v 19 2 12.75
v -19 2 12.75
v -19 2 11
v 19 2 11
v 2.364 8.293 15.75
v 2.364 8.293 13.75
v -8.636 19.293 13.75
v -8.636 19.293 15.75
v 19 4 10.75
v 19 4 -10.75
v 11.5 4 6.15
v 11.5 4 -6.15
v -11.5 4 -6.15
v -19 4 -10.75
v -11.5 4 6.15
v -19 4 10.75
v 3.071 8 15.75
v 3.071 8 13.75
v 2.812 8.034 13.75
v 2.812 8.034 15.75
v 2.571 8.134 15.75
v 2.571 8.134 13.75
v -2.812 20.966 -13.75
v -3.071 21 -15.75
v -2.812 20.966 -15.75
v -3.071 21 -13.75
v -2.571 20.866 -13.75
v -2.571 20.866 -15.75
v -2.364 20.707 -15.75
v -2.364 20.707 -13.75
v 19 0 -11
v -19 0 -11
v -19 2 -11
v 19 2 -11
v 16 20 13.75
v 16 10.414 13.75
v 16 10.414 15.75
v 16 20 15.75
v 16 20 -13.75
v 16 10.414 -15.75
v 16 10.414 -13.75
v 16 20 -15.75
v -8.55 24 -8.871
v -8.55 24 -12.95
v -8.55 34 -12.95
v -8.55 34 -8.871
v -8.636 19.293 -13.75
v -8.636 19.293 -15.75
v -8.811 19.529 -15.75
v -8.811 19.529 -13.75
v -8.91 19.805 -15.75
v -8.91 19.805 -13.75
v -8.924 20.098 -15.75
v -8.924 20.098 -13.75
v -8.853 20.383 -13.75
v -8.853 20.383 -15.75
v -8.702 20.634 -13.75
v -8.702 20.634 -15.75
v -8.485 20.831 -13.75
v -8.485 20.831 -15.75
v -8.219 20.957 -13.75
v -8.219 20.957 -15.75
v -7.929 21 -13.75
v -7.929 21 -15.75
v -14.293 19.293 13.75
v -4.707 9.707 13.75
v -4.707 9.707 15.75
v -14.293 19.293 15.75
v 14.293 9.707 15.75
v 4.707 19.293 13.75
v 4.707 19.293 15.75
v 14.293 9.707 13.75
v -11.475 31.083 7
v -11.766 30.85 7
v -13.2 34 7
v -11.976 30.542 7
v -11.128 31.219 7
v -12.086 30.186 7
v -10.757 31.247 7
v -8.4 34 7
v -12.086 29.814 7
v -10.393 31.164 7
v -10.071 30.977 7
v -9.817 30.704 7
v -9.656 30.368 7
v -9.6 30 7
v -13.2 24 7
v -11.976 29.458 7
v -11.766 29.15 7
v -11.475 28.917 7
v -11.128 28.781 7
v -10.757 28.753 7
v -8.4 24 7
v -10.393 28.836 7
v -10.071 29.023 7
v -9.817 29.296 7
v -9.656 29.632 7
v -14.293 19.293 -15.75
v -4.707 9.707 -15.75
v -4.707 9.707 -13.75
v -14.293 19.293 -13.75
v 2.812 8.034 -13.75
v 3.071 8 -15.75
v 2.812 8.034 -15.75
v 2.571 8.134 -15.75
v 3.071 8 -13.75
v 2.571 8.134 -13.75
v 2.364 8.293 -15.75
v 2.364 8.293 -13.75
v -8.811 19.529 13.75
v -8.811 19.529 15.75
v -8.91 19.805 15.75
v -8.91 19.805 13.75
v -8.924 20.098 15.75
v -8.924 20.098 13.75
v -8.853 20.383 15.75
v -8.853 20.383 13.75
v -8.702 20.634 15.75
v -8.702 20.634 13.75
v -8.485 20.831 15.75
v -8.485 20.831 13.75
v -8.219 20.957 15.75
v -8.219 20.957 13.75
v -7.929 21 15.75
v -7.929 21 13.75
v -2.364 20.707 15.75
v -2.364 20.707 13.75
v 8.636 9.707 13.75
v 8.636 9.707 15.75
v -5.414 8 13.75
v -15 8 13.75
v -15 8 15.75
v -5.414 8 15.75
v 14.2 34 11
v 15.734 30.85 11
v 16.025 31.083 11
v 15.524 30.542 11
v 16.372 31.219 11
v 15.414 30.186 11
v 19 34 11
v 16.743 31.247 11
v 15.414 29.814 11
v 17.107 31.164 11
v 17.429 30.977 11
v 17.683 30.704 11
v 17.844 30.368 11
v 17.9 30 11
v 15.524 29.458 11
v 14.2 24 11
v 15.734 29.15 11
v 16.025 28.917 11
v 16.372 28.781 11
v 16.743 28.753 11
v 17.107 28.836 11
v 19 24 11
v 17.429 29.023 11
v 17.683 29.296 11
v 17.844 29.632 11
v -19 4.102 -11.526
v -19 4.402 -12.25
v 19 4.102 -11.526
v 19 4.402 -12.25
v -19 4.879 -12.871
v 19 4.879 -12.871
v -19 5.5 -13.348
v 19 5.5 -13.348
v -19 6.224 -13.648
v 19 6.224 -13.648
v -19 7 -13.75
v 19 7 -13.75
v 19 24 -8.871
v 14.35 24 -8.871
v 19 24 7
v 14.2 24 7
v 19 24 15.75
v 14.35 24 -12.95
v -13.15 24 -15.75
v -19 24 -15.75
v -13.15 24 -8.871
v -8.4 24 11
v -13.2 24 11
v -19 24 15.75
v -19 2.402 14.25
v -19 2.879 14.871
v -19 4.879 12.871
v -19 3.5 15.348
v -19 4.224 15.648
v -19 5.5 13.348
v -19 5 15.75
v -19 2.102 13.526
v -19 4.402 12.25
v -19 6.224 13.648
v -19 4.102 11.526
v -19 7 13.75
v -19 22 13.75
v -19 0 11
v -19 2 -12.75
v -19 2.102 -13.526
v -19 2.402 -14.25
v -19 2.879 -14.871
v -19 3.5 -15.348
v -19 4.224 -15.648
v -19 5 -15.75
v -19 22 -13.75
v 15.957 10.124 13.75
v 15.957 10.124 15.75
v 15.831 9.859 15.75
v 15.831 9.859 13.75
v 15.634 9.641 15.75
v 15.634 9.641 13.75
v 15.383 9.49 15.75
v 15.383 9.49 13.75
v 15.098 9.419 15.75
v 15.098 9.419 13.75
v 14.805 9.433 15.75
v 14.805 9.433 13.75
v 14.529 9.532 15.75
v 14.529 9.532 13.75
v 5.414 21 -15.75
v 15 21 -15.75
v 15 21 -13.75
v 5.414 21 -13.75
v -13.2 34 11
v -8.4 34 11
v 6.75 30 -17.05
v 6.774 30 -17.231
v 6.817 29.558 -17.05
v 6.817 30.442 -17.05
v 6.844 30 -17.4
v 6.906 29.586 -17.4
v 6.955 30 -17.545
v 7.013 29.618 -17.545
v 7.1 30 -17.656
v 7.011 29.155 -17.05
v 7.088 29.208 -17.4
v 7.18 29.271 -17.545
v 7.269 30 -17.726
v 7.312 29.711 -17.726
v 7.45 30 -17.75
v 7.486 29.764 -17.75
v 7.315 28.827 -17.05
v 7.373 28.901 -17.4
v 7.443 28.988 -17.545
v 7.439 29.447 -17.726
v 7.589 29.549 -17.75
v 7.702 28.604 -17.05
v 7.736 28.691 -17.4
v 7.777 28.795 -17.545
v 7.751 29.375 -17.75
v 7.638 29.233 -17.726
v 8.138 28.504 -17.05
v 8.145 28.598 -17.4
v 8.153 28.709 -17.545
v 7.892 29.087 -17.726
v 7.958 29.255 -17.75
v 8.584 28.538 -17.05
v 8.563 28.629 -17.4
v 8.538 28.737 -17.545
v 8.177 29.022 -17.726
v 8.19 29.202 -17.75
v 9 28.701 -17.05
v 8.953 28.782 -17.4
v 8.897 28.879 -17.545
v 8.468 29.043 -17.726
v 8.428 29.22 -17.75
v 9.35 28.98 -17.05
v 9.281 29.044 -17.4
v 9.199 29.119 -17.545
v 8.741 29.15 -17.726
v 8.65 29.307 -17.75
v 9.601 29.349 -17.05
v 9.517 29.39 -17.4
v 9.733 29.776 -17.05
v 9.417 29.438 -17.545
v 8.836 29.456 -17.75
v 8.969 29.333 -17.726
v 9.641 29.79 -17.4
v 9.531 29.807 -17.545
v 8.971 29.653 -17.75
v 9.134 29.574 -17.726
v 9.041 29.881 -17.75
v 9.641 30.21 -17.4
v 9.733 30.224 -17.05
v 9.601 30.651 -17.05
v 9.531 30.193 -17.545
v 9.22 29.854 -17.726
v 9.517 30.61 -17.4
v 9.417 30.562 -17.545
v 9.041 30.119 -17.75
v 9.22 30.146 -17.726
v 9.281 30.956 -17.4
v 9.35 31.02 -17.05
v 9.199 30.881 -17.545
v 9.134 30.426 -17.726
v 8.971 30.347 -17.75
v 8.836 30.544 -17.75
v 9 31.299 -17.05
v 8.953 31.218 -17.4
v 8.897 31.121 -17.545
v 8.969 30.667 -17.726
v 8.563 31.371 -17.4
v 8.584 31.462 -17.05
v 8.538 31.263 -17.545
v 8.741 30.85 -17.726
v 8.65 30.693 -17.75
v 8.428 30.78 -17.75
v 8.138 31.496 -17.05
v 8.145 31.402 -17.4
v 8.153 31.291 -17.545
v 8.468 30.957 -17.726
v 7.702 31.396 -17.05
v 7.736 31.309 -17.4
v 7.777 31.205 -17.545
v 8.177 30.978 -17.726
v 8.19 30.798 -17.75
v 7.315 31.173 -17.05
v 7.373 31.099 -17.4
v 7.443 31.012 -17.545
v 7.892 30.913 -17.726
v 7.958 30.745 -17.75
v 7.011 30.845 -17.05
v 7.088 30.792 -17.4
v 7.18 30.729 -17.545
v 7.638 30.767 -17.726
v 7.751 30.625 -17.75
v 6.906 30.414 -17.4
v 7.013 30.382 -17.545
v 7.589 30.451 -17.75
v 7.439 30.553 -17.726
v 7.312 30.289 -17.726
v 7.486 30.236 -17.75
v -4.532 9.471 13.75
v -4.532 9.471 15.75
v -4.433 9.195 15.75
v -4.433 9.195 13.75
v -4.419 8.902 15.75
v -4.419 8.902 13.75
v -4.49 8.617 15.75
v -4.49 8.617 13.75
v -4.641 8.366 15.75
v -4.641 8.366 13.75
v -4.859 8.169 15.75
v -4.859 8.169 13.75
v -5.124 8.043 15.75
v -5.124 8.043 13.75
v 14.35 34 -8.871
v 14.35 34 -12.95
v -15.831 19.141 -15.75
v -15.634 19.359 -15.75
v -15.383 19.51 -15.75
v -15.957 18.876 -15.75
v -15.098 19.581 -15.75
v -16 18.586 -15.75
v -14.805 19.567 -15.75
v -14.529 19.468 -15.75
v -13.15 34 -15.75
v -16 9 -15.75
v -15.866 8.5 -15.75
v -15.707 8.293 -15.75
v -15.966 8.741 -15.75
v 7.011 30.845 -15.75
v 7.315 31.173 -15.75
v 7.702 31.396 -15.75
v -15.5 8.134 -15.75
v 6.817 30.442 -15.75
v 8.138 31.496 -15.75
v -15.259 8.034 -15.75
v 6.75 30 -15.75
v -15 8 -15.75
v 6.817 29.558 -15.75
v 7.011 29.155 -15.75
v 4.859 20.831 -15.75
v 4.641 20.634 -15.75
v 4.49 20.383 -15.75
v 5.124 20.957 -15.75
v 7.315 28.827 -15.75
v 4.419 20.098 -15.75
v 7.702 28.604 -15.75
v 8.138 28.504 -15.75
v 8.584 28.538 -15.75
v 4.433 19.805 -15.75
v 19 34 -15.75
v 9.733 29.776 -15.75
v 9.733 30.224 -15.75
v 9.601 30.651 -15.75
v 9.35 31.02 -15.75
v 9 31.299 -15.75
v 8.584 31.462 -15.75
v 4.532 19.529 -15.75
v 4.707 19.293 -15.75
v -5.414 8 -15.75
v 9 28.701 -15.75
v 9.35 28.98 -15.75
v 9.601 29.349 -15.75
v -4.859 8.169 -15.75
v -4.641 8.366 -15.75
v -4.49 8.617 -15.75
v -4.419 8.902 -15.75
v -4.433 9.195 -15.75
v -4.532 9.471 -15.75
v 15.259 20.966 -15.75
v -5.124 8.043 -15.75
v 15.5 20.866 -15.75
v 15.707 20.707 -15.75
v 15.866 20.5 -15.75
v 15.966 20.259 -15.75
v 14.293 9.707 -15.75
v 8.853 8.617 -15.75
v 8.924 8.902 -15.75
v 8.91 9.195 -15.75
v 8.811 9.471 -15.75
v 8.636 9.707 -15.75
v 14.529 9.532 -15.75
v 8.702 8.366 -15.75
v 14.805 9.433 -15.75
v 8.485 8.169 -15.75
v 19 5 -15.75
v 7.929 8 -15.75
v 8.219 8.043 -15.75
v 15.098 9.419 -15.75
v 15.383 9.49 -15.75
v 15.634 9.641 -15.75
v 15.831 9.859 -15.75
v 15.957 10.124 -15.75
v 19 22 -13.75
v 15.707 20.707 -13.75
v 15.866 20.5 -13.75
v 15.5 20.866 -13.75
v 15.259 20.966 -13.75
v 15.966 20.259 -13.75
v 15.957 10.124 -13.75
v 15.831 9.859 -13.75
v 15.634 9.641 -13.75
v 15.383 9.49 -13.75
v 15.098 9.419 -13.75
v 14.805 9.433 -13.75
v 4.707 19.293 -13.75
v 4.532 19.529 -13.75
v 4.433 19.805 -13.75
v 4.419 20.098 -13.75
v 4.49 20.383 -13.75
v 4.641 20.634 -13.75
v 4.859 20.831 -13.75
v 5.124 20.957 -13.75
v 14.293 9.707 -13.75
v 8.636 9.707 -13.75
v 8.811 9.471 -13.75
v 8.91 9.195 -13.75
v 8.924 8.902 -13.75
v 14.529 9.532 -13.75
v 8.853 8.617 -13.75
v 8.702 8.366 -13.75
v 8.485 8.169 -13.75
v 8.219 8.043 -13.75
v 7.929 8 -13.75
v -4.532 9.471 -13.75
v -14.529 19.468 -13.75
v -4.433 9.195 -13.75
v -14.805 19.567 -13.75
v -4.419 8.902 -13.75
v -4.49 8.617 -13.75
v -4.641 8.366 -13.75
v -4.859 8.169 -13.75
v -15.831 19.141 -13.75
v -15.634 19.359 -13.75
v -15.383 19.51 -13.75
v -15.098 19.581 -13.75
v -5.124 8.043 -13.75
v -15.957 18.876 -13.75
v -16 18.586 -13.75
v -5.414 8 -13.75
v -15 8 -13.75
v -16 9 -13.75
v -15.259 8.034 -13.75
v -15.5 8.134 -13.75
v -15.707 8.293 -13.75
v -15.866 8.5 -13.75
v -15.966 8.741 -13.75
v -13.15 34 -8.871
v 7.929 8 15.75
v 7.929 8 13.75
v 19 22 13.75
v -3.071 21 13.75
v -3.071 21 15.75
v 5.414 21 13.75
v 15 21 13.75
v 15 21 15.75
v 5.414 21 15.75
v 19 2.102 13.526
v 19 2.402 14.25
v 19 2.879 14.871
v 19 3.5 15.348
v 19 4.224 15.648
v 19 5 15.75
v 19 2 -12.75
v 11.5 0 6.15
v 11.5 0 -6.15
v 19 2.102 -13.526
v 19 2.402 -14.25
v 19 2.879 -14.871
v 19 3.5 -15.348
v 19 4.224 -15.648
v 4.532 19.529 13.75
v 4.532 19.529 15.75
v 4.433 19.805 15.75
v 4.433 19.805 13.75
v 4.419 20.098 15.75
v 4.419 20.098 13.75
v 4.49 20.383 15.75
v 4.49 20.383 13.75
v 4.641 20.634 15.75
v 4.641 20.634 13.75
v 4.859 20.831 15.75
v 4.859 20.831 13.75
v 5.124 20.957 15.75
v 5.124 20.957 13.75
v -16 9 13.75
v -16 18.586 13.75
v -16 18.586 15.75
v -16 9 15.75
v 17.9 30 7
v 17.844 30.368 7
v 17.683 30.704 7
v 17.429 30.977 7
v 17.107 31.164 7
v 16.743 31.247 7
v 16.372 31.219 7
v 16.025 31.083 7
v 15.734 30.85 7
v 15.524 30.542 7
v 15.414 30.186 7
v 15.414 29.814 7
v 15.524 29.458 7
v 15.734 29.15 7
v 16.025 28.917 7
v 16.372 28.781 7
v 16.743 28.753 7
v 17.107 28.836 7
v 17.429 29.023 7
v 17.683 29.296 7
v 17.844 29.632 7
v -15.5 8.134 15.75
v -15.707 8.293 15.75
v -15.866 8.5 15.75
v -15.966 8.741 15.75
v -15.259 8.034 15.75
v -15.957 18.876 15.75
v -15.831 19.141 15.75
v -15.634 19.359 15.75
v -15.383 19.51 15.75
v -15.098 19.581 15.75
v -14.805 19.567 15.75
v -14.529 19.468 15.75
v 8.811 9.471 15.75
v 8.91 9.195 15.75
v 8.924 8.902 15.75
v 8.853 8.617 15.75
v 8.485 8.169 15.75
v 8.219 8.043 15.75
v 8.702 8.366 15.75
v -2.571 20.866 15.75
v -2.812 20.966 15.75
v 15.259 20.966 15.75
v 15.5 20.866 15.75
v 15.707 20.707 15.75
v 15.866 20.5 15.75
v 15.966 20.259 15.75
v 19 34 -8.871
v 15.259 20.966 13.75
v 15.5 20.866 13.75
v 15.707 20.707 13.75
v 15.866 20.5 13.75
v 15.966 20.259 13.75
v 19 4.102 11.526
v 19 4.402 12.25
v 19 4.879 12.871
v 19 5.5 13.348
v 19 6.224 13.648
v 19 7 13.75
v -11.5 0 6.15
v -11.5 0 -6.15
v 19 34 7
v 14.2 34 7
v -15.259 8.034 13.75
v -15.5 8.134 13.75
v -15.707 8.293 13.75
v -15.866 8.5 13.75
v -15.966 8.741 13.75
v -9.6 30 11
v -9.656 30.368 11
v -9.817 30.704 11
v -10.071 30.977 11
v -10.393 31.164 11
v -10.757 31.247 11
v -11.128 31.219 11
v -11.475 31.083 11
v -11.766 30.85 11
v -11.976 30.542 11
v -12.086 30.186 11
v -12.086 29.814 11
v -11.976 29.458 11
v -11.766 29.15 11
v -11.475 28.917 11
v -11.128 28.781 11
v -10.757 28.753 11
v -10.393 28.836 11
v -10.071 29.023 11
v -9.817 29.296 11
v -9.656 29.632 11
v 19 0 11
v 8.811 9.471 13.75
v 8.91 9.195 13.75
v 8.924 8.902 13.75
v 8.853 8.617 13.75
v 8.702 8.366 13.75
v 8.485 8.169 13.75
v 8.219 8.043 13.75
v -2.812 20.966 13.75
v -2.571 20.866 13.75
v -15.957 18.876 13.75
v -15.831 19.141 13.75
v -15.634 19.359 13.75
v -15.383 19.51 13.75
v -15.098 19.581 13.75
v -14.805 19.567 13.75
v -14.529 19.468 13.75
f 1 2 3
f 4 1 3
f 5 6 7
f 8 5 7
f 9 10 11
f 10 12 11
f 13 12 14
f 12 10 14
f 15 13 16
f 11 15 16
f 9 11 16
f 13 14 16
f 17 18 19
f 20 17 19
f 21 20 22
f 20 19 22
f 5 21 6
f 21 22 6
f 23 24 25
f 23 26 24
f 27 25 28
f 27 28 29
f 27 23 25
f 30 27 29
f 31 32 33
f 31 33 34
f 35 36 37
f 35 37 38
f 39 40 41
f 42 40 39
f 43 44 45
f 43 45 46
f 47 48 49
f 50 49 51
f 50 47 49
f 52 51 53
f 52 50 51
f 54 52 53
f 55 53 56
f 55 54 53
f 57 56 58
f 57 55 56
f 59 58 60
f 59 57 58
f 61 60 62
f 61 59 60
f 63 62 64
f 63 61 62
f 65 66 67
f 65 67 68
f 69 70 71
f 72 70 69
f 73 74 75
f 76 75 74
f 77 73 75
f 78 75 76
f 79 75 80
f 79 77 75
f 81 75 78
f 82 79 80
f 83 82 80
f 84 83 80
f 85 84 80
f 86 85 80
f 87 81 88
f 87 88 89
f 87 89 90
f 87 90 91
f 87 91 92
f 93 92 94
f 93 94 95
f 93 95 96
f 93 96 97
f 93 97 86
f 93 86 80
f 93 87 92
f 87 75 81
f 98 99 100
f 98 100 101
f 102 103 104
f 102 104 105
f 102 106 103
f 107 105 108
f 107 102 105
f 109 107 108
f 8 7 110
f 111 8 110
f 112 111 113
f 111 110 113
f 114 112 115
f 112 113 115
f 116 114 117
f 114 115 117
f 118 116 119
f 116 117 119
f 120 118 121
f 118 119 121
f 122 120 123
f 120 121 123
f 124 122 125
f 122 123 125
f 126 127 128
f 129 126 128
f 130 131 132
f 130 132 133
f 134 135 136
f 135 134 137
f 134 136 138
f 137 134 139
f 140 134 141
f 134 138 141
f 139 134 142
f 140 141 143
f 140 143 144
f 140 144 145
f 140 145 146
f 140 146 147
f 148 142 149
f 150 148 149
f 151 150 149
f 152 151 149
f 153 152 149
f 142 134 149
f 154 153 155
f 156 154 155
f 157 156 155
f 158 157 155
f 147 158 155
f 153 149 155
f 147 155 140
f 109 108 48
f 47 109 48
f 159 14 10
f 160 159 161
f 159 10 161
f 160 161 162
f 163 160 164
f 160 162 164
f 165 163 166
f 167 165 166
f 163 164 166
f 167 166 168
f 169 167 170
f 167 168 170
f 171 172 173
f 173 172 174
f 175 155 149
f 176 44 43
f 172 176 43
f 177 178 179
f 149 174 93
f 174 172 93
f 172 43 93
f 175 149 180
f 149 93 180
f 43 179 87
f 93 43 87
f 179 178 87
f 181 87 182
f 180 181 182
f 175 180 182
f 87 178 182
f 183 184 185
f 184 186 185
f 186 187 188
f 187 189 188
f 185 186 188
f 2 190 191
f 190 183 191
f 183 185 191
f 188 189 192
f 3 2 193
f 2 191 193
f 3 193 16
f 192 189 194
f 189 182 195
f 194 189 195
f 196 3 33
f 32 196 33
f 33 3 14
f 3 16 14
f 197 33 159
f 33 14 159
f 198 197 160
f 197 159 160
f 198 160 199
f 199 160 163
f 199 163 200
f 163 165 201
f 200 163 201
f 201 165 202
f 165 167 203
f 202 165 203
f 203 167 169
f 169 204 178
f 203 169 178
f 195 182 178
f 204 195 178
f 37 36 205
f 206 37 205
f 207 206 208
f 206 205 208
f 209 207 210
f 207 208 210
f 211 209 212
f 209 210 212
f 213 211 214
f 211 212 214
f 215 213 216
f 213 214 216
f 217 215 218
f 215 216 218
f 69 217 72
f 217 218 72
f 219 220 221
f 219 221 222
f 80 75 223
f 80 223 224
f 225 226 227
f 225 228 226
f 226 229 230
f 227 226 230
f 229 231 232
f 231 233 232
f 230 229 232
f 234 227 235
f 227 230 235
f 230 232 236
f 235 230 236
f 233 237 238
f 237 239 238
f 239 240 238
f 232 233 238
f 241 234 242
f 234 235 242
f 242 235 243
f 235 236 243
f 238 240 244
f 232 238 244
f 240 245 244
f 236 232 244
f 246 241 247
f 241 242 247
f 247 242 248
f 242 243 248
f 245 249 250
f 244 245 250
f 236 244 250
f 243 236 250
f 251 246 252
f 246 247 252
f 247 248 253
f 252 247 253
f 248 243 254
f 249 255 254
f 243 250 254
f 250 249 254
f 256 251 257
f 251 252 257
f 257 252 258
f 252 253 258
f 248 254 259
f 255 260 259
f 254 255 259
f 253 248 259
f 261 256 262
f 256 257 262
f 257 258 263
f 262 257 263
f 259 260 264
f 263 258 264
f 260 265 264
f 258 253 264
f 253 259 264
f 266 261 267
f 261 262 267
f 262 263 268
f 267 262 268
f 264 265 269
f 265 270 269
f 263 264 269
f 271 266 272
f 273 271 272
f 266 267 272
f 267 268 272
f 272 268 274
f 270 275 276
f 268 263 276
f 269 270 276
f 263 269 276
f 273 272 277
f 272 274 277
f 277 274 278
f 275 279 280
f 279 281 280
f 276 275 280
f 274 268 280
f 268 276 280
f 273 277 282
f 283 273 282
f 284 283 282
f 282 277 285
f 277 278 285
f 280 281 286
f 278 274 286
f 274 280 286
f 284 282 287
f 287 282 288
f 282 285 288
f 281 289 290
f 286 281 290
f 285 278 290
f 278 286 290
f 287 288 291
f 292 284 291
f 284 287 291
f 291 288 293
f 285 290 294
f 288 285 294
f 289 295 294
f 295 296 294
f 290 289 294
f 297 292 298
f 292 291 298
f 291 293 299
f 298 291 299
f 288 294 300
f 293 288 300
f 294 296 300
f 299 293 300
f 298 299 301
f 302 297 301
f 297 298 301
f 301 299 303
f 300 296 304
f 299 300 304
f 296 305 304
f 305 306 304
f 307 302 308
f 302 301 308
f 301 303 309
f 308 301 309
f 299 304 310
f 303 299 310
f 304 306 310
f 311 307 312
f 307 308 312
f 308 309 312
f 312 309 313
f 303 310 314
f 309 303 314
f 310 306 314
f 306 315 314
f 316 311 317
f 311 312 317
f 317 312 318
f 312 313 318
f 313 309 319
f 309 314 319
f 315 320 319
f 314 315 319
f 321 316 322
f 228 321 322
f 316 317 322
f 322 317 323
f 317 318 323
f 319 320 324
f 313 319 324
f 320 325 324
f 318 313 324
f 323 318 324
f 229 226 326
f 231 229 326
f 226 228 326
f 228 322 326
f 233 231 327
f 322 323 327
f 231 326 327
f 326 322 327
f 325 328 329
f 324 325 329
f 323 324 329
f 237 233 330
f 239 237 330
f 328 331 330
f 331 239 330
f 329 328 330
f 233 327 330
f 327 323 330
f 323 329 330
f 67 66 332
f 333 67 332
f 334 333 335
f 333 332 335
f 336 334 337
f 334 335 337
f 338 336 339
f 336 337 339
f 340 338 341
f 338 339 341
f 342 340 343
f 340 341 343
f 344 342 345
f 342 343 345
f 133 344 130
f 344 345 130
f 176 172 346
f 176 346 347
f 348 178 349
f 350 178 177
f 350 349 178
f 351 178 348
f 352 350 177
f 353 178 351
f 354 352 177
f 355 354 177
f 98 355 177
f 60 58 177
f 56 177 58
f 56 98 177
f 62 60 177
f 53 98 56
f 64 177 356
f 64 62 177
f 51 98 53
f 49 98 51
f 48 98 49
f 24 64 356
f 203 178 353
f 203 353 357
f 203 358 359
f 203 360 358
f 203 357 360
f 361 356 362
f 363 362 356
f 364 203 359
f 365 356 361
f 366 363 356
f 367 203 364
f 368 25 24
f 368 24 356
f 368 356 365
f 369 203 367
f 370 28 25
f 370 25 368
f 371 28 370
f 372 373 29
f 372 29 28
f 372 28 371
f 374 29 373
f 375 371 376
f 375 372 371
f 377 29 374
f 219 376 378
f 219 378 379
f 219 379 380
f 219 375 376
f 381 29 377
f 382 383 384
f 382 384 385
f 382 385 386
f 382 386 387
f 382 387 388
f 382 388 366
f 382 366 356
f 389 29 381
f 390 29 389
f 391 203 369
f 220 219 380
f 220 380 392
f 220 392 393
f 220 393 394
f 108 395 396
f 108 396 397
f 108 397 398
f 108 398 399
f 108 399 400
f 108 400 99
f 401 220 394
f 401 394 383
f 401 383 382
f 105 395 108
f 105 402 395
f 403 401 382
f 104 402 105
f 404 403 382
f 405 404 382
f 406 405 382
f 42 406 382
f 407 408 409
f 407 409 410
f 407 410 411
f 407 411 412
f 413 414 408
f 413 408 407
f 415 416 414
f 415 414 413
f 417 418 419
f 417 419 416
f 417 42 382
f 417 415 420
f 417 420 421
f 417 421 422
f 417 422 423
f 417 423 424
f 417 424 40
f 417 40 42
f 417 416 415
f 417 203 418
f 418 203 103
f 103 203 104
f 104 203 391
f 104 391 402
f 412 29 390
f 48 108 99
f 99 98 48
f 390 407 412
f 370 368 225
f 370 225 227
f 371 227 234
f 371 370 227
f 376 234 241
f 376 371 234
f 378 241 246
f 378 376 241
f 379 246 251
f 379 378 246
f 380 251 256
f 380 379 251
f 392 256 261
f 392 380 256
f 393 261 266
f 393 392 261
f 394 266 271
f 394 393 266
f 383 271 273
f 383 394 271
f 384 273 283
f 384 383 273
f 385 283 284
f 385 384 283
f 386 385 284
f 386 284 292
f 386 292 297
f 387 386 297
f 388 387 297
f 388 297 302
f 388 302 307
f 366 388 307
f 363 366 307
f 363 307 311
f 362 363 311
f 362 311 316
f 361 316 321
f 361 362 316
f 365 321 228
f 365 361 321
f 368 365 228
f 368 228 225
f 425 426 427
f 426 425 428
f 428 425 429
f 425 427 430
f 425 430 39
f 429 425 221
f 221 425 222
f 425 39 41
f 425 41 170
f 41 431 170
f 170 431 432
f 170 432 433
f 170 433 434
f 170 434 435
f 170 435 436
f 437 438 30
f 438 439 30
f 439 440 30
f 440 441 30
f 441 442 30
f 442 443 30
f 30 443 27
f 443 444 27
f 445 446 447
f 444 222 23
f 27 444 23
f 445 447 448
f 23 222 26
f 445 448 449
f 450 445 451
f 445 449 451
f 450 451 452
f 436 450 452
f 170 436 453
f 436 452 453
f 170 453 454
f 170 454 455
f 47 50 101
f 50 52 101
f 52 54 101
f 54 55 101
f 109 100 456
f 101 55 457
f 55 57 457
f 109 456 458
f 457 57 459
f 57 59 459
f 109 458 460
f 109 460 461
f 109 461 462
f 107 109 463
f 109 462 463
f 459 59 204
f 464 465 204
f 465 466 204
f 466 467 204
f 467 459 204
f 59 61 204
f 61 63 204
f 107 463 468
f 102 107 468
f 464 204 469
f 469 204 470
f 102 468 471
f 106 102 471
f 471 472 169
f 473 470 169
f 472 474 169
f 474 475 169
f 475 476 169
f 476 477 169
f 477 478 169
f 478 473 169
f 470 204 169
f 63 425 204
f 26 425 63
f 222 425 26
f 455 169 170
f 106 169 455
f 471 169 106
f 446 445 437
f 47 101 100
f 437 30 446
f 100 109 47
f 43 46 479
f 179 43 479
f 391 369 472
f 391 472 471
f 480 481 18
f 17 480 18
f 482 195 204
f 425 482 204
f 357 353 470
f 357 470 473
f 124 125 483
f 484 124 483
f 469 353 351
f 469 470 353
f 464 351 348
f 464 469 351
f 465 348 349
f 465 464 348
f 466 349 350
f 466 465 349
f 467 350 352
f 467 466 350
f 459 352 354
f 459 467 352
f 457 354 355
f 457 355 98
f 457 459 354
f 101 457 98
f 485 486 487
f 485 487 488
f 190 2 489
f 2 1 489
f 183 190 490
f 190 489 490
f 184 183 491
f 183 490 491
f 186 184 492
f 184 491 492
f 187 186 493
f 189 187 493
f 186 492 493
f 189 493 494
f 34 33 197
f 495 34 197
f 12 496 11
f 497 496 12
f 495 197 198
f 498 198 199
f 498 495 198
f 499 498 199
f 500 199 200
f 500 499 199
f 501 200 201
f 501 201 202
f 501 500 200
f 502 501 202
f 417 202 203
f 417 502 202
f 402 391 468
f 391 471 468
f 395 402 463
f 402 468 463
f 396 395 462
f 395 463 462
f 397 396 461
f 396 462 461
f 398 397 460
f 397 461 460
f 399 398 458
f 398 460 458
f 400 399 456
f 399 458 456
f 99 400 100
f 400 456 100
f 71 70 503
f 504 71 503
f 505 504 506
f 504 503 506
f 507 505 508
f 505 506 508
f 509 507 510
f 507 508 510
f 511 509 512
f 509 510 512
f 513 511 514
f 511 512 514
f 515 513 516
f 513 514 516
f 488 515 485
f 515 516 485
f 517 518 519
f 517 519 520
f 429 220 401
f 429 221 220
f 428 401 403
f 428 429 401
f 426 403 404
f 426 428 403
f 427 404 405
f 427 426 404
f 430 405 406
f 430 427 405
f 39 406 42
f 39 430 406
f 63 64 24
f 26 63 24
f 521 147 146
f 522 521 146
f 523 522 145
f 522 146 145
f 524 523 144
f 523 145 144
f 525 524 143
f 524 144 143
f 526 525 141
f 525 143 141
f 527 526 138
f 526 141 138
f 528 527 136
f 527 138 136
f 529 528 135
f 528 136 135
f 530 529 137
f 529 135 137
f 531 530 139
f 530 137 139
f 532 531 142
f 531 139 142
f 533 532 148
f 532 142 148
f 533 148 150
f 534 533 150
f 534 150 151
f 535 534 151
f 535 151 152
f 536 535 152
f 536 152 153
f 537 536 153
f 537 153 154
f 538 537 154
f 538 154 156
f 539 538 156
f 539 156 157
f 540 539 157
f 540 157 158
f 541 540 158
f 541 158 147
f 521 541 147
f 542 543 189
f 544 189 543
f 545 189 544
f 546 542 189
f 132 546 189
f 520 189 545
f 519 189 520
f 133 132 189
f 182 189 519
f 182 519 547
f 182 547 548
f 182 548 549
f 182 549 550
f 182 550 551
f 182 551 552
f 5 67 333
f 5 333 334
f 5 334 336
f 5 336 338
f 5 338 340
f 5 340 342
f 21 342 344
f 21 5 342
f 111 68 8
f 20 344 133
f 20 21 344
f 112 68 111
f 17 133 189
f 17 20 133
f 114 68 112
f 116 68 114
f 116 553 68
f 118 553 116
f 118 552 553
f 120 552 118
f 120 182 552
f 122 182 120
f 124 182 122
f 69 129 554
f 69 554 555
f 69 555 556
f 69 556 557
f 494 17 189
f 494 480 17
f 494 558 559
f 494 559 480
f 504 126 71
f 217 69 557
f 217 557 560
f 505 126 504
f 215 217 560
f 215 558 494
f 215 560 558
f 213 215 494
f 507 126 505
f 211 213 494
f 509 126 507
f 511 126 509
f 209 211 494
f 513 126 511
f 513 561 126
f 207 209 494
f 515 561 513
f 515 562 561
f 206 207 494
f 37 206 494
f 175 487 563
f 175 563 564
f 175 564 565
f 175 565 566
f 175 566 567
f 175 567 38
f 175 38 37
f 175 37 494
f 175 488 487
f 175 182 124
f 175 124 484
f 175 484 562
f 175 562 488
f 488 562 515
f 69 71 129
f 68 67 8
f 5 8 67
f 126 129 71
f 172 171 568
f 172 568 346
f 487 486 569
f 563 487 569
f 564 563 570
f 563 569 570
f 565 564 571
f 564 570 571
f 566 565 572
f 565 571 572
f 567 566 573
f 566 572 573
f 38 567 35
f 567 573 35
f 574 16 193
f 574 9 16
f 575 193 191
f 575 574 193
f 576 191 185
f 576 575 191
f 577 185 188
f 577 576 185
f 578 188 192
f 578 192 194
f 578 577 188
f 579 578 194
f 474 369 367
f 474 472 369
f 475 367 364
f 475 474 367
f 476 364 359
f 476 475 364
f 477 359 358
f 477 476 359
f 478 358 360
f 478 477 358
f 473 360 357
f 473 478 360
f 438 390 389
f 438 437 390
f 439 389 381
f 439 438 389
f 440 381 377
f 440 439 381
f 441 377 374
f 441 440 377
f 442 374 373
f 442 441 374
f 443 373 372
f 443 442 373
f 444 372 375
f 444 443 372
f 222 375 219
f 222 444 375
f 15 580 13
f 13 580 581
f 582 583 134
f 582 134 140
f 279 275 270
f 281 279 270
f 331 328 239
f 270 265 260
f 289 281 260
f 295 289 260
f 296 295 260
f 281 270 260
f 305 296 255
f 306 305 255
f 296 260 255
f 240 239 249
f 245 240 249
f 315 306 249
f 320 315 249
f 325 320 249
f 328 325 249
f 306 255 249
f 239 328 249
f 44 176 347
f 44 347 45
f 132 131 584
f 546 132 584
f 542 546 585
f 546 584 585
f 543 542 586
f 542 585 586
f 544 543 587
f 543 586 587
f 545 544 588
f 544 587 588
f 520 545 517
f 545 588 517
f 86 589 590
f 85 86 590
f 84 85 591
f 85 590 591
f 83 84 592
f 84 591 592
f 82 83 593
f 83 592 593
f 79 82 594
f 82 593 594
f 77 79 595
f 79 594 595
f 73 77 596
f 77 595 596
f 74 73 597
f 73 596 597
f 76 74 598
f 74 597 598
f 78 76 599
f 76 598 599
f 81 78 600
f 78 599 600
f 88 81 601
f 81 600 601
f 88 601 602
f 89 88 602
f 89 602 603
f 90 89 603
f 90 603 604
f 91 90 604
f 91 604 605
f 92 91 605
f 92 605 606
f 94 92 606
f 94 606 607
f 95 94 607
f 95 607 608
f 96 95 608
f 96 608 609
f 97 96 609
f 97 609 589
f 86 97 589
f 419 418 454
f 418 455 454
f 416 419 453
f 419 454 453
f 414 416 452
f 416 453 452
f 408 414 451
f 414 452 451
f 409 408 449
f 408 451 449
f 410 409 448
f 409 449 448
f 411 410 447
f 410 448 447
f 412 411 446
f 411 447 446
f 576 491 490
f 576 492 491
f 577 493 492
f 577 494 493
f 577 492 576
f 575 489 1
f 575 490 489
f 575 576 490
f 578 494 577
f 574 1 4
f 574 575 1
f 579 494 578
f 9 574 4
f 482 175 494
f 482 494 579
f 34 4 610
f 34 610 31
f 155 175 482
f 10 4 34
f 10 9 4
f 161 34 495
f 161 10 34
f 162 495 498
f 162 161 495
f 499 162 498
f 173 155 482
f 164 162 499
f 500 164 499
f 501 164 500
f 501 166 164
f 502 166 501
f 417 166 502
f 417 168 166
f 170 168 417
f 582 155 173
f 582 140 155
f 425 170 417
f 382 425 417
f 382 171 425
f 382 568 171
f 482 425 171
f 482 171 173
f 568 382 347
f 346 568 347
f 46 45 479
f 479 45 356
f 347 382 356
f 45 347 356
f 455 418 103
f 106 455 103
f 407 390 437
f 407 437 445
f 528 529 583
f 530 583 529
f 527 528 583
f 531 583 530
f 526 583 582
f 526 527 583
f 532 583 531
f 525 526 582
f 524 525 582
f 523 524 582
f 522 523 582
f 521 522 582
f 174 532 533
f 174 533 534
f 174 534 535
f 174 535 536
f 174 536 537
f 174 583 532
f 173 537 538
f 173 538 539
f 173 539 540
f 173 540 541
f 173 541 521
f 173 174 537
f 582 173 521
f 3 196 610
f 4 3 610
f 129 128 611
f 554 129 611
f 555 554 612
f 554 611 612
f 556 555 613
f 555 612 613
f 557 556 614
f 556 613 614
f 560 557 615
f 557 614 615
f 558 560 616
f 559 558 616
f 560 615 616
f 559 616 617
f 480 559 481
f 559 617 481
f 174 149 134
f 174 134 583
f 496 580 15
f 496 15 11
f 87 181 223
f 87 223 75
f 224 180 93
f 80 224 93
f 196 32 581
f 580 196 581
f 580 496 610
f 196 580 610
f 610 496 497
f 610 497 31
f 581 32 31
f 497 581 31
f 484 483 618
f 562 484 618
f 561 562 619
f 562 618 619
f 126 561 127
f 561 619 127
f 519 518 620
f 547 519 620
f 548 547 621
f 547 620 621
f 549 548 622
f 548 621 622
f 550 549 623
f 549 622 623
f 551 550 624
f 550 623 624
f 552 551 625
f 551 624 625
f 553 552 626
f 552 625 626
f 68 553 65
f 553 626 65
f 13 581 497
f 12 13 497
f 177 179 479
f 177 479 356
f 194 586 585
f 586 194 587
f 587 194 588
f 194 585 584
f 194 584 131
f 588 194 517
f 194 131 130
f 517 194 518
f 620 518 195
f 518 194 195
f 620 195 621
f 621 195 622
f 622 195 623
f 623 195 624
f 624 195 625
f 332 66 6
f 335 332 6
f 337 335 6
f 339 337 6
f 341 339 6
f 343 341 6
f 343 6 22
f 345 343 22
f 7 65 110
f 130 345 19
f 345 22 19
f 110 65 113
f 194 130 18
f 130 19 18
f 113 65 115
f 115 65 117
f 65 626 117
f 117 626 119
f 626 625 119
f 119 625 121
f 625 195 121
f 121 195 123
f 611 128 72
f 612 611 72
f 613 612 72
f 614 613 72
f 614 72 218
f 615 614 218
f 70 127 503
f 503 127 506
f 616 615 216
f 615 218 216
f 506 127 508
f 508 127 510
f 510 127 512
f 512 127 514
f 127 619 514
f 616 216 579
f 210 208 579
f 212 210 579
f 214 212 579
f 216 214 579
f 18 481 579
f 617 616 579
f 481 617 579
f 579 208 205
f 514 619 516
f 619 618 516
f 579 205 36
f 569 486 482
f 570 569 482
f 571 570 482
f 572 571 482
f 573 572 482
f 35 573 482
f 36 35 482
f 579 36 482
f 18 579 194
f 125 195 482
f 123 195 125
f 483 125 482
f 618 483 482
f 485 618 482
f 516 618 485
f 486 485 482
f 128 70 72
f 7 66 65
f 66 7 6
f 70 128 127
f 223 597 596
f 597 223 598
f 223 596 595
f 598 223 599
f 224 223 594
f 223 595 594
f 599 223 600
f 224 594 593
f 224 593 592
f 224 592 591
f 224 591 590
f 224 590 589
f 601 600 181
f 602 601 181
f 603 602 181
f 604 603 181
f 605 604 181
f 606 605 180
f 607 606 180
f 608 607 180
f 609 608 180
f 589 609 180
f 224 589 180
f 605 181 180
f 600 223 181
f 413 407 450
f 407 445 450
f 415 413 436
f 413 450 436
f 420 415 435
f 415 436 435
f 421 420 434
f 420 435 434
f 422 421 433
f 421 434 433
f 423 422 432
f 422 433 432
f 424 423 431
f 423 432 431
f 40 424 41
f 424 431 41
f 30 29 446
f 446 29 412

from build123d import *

# Parameters (mm, degrees)
SKETCH1_W           = 38
SKETCH1_H           = 22
SKETCH1_W_2         = 23
SKETCH1_H_2         = 12.3
BOSS_EXTRUDE1_DEPTH = 4
BOSS_EXTRUDE2_DEPTH = 38
FILLET1_R           = 3
CUT_EXTRUDE5_DEPTH  = 44.923228479
FILLET3_R           = 1
MIRROR1_START       = 13.75
MIRROR1_DEPTH       = 2
SKETCH10_W          = 4.8
SKETCH10_H          = 4
BOSS_EXTRUDE4_DEPTH = 10
SKETCH11_R          = 1.25
CUT_EXTRUDE6_DEPTH  = 48.25
BOSS_EXTRUDE5_DEPTH = 10
BOSS_EXTRUDE6_START = -15.75
SKETCH14_R          = 1.5
BOSS_EXTRUDE6_DEPTH = 2
FILLET4_R           = 0.7


# Read off the part's stored shape, not the designer's step: Mirror1
with BuildPart() as part:
    # Sketch1 → Boss-Extrude1 (new body)
    with BuildSketch(Plane(origin=(0, 0, 0), x_dir=(1, 0, 0), z_dir=(0, 1, 0))):
        Rectangle(SKETCH1_W, SKETCH1_H)
        Rectangle(SKETCH1_W_2, SKETCH1_H_2, mode=Mode.SUBTRACT)
    extrude(amount=BOSS_EXTRUDE1_DEPTH)

    # Sketch2 → Boss-Extrude2 (add)
    with BuildSketch(Plane.ZY.offset(19)):
        Polygon((-11, 2), (-15.75, 2), (-15.75, 22), (-15.75, 24), (15.75, 24), (15.75, 22), (15.75, 2), (11, 2), (11, 4), (13.75, 4), (13.75, 22), (-13.75, 22), (-13.75, 4), (-11, 4), align=None)
    extrude(amount=-BOSS_EXTRUDE2_DEPTH)

    # Fillet1
    fillet1_edges = [part.edges().sort_by_distance(p)[0] for p in [
        (0, 2, -15.75),
        (0, 2, 15.75),
        (0, 4, 13.75),
        (0, 4, -13.75),
    ]]
    fillet(fillet1_edges, radius=FILLET1_R)

    # Sketch8 → Cut-Extrude5 (cut, through all)
    with BuildSketch(Plane(origin=(0, 0, -15.75), x_dir=(-1, 0, 0), z_dir=(0, 0, -1))):
        Polygon((-16, 8), (-16, 21), (-3, 21), align=None)
        Polygon((3, 8), (16, 21), (16, 8), align=None)
        Polygon((-10.343145751, 8), (-2.656854249, 8), (10.343145751, 21), (2.656854249, 21), align=None)
    extrude(amount=-CUT_EXTRUDE5_DEPTH, mode=Mode.SUBTRACT)

    # Fillet3
    fillet3_edges = [part.edges().sort_by_distance(p)[0] for p in [
        (-16, 8, -14.75),
        (-3, 8, -14.75),
        (-16, 21, -14.75),
        (10.343145751, 8, -14.75),
        (-2.656854249, 21, -14.75),
        (-10.343145751, 21, -14.75),
        (2.656854249, 8, -14.75),
        (3, 21, -14.75),
        (16, 8, -14.75),
        (16, 21, -14.75),
    ]]
    fillet(fillet3_edges, radius=FILLET3_R)

    # Mirror1 outline → Mirror1 (add)
    with BuildSketch(Plane.XY.offset(MIRROR1_START)):
        with BuildLine():
            ThreePointArc((15, 21), (15.707106781, 20.707106781), (16, 20))
            Line((16, 20), (16, 21))
            Line((16, 21), (15, 21))
        make_face()
        with BuildLine():
            Line((16, 8), (16, 10.414213562))
            ThreePointArc((16, 10.414213562), (15.382683432, 9.49033403), (14.292893219, 9.707106781))
            Line((14.292893219, 9.707106781), (16, 8))
        make_face()
        with BuildLine():
            ThreePointArc((4.707106781, 19.292893219), (4.49033403, 20.382683432), (5.414213562, 21))
            Line((5.414213562, 21), (3, 21))
            Line((3, 21), (4.707106781, 19.292893219))
        make_face()
        with BuildLine():
            ThreePointArc((-15, 8), (-15.707106781, 8.292893219), (-16, 9))
            Line((-16, 9), (-16, 8))
            Line((-16, 8), (-15, 8))
        make_face()
        with BuildLine():
            Line((-16, 21), (-16, 18.585786438))
            ThreePointArc((-16, 18.585786438), (-15.382683432, 19.50966597), (-14.292893219, 19.292893219))
            Line((-14.292893219, 19.292893219), (-16, 21))
        make_face()
        with BuildLine():
            ThreePointArc((-4.707106781, 9.707106781), (-4.49033403, 8.617316568), (-5.414213562, 8))
            Line((-5.414213562, 8), (-3, 8))
            Line((-3, 8), (-4.707106781, 9.707106781))
        make_face()
        with BuildLine():
            ThreePointArc((8.636038969, 9.707106781), (8.852811721, 8.617316567), (7.928932188, 8))
            Line((7.928932188, 8), (10.343145751, 8))
            Line((10.343145751, 8), (8.636038969, 9.707106781))
        make_face()
        with BuildLine():
            Line((2.656854249, 8), (3.071067812, 8))
            ThreePointArc((3.071067812, 8), (2.68838438, 8.076120467), (2.363961031, 8.292893219))
            Line((2.363961031, 8.292893219), (2.656854249, 8))
        make_face()
        with BuildLine():
            ThreePointArc((-3.071067812, 21), (-2.68838438, 20.923879533), (-2.363961031, 20.707106781))
            Line((-2.363961031, 20.707106781), (-2.656854249, 21))
            Line((-2.656854249, 21), (-3.071067812, 21))
        make_face()
        with BuildLine():
            Line((-10.343145751, 21), (-8.636038969, 19.292893219))
            ThreePointArc((-8.636038969, 19.292893219), (-8.852811721, 20.382683433), (-7.928932188, 21))
            Line((-7.928932188, 21), (-10.343145751, 21))
        make_face()
    extrude(amount=MIRROR1_DEPTH)

    # Sketch10 → Boss-Extrude4 (add)
    with BuildSketch(Plane(origin=(0, 24, 0), x_dir=(1, 0, 0), z_dir=(0, 1, 0))):
        with Locations((-10.8, -9)):
            Rectangle(SKETCH10_W, SKETCH10_H)
        with Locations((16.6, -9)):
            Rectangle(SKETCH10_W, SKETCH10_H)
    extrude(amount=BOSS_EXTRUDE4_DEPTH)

    # Sketch11 → Cut-Extrude6 (cut, through all)
    with BuildSketch(Plane.XY.offset(11)):
        with Locations((16.65, 30)):
            Circle(SKETCH11_R)
        with Locations((-10.85, 30)):
            Circle(SKETCH11_R)
    extrude(amount=-CUT_EXTRUDE6_DEPTH, mode=Mode.SUBTRACT)

    # Sketch12 → Boss-Extrude5 (add)
    with BuildSketch(Plane(origin=(0, 24, 0), x_dir=(1, 0, 0), z_dir=(0, 1, 0))):
        Polygon((-8.55, 8.870549132), (-13.15, 8.870549132), (-13.15, 15.75), (19, 15.75), (19, 8.870549132), (14.35, 8.870549132), (14.35, 12.95), (-8.55, 12.95), align=None)
    extrude(amount=BOSS_EXTRUDE5_DEPTH)

    # Sketch14 → Boss-Extrude6 (add)
    with BuildSketch(Plane.XY.offset(BOSS_EXTRUDE6_START)):
        with Locations(Location((8.25, 30, 0), (0, 0, 180))):
            Circle(SKETCH14_R)
    extrude(amount=-BOSS_EXTRUDE6_DEPTH)

    # Fillet4
    fillet4_edges = [part.edges().sort_by_distance(p)[0] for p in [
        (9.75, 30, -17.75),
    ]]
    fillet(fillet4_edges, radius=FILLET4_R)


solid = part.part
